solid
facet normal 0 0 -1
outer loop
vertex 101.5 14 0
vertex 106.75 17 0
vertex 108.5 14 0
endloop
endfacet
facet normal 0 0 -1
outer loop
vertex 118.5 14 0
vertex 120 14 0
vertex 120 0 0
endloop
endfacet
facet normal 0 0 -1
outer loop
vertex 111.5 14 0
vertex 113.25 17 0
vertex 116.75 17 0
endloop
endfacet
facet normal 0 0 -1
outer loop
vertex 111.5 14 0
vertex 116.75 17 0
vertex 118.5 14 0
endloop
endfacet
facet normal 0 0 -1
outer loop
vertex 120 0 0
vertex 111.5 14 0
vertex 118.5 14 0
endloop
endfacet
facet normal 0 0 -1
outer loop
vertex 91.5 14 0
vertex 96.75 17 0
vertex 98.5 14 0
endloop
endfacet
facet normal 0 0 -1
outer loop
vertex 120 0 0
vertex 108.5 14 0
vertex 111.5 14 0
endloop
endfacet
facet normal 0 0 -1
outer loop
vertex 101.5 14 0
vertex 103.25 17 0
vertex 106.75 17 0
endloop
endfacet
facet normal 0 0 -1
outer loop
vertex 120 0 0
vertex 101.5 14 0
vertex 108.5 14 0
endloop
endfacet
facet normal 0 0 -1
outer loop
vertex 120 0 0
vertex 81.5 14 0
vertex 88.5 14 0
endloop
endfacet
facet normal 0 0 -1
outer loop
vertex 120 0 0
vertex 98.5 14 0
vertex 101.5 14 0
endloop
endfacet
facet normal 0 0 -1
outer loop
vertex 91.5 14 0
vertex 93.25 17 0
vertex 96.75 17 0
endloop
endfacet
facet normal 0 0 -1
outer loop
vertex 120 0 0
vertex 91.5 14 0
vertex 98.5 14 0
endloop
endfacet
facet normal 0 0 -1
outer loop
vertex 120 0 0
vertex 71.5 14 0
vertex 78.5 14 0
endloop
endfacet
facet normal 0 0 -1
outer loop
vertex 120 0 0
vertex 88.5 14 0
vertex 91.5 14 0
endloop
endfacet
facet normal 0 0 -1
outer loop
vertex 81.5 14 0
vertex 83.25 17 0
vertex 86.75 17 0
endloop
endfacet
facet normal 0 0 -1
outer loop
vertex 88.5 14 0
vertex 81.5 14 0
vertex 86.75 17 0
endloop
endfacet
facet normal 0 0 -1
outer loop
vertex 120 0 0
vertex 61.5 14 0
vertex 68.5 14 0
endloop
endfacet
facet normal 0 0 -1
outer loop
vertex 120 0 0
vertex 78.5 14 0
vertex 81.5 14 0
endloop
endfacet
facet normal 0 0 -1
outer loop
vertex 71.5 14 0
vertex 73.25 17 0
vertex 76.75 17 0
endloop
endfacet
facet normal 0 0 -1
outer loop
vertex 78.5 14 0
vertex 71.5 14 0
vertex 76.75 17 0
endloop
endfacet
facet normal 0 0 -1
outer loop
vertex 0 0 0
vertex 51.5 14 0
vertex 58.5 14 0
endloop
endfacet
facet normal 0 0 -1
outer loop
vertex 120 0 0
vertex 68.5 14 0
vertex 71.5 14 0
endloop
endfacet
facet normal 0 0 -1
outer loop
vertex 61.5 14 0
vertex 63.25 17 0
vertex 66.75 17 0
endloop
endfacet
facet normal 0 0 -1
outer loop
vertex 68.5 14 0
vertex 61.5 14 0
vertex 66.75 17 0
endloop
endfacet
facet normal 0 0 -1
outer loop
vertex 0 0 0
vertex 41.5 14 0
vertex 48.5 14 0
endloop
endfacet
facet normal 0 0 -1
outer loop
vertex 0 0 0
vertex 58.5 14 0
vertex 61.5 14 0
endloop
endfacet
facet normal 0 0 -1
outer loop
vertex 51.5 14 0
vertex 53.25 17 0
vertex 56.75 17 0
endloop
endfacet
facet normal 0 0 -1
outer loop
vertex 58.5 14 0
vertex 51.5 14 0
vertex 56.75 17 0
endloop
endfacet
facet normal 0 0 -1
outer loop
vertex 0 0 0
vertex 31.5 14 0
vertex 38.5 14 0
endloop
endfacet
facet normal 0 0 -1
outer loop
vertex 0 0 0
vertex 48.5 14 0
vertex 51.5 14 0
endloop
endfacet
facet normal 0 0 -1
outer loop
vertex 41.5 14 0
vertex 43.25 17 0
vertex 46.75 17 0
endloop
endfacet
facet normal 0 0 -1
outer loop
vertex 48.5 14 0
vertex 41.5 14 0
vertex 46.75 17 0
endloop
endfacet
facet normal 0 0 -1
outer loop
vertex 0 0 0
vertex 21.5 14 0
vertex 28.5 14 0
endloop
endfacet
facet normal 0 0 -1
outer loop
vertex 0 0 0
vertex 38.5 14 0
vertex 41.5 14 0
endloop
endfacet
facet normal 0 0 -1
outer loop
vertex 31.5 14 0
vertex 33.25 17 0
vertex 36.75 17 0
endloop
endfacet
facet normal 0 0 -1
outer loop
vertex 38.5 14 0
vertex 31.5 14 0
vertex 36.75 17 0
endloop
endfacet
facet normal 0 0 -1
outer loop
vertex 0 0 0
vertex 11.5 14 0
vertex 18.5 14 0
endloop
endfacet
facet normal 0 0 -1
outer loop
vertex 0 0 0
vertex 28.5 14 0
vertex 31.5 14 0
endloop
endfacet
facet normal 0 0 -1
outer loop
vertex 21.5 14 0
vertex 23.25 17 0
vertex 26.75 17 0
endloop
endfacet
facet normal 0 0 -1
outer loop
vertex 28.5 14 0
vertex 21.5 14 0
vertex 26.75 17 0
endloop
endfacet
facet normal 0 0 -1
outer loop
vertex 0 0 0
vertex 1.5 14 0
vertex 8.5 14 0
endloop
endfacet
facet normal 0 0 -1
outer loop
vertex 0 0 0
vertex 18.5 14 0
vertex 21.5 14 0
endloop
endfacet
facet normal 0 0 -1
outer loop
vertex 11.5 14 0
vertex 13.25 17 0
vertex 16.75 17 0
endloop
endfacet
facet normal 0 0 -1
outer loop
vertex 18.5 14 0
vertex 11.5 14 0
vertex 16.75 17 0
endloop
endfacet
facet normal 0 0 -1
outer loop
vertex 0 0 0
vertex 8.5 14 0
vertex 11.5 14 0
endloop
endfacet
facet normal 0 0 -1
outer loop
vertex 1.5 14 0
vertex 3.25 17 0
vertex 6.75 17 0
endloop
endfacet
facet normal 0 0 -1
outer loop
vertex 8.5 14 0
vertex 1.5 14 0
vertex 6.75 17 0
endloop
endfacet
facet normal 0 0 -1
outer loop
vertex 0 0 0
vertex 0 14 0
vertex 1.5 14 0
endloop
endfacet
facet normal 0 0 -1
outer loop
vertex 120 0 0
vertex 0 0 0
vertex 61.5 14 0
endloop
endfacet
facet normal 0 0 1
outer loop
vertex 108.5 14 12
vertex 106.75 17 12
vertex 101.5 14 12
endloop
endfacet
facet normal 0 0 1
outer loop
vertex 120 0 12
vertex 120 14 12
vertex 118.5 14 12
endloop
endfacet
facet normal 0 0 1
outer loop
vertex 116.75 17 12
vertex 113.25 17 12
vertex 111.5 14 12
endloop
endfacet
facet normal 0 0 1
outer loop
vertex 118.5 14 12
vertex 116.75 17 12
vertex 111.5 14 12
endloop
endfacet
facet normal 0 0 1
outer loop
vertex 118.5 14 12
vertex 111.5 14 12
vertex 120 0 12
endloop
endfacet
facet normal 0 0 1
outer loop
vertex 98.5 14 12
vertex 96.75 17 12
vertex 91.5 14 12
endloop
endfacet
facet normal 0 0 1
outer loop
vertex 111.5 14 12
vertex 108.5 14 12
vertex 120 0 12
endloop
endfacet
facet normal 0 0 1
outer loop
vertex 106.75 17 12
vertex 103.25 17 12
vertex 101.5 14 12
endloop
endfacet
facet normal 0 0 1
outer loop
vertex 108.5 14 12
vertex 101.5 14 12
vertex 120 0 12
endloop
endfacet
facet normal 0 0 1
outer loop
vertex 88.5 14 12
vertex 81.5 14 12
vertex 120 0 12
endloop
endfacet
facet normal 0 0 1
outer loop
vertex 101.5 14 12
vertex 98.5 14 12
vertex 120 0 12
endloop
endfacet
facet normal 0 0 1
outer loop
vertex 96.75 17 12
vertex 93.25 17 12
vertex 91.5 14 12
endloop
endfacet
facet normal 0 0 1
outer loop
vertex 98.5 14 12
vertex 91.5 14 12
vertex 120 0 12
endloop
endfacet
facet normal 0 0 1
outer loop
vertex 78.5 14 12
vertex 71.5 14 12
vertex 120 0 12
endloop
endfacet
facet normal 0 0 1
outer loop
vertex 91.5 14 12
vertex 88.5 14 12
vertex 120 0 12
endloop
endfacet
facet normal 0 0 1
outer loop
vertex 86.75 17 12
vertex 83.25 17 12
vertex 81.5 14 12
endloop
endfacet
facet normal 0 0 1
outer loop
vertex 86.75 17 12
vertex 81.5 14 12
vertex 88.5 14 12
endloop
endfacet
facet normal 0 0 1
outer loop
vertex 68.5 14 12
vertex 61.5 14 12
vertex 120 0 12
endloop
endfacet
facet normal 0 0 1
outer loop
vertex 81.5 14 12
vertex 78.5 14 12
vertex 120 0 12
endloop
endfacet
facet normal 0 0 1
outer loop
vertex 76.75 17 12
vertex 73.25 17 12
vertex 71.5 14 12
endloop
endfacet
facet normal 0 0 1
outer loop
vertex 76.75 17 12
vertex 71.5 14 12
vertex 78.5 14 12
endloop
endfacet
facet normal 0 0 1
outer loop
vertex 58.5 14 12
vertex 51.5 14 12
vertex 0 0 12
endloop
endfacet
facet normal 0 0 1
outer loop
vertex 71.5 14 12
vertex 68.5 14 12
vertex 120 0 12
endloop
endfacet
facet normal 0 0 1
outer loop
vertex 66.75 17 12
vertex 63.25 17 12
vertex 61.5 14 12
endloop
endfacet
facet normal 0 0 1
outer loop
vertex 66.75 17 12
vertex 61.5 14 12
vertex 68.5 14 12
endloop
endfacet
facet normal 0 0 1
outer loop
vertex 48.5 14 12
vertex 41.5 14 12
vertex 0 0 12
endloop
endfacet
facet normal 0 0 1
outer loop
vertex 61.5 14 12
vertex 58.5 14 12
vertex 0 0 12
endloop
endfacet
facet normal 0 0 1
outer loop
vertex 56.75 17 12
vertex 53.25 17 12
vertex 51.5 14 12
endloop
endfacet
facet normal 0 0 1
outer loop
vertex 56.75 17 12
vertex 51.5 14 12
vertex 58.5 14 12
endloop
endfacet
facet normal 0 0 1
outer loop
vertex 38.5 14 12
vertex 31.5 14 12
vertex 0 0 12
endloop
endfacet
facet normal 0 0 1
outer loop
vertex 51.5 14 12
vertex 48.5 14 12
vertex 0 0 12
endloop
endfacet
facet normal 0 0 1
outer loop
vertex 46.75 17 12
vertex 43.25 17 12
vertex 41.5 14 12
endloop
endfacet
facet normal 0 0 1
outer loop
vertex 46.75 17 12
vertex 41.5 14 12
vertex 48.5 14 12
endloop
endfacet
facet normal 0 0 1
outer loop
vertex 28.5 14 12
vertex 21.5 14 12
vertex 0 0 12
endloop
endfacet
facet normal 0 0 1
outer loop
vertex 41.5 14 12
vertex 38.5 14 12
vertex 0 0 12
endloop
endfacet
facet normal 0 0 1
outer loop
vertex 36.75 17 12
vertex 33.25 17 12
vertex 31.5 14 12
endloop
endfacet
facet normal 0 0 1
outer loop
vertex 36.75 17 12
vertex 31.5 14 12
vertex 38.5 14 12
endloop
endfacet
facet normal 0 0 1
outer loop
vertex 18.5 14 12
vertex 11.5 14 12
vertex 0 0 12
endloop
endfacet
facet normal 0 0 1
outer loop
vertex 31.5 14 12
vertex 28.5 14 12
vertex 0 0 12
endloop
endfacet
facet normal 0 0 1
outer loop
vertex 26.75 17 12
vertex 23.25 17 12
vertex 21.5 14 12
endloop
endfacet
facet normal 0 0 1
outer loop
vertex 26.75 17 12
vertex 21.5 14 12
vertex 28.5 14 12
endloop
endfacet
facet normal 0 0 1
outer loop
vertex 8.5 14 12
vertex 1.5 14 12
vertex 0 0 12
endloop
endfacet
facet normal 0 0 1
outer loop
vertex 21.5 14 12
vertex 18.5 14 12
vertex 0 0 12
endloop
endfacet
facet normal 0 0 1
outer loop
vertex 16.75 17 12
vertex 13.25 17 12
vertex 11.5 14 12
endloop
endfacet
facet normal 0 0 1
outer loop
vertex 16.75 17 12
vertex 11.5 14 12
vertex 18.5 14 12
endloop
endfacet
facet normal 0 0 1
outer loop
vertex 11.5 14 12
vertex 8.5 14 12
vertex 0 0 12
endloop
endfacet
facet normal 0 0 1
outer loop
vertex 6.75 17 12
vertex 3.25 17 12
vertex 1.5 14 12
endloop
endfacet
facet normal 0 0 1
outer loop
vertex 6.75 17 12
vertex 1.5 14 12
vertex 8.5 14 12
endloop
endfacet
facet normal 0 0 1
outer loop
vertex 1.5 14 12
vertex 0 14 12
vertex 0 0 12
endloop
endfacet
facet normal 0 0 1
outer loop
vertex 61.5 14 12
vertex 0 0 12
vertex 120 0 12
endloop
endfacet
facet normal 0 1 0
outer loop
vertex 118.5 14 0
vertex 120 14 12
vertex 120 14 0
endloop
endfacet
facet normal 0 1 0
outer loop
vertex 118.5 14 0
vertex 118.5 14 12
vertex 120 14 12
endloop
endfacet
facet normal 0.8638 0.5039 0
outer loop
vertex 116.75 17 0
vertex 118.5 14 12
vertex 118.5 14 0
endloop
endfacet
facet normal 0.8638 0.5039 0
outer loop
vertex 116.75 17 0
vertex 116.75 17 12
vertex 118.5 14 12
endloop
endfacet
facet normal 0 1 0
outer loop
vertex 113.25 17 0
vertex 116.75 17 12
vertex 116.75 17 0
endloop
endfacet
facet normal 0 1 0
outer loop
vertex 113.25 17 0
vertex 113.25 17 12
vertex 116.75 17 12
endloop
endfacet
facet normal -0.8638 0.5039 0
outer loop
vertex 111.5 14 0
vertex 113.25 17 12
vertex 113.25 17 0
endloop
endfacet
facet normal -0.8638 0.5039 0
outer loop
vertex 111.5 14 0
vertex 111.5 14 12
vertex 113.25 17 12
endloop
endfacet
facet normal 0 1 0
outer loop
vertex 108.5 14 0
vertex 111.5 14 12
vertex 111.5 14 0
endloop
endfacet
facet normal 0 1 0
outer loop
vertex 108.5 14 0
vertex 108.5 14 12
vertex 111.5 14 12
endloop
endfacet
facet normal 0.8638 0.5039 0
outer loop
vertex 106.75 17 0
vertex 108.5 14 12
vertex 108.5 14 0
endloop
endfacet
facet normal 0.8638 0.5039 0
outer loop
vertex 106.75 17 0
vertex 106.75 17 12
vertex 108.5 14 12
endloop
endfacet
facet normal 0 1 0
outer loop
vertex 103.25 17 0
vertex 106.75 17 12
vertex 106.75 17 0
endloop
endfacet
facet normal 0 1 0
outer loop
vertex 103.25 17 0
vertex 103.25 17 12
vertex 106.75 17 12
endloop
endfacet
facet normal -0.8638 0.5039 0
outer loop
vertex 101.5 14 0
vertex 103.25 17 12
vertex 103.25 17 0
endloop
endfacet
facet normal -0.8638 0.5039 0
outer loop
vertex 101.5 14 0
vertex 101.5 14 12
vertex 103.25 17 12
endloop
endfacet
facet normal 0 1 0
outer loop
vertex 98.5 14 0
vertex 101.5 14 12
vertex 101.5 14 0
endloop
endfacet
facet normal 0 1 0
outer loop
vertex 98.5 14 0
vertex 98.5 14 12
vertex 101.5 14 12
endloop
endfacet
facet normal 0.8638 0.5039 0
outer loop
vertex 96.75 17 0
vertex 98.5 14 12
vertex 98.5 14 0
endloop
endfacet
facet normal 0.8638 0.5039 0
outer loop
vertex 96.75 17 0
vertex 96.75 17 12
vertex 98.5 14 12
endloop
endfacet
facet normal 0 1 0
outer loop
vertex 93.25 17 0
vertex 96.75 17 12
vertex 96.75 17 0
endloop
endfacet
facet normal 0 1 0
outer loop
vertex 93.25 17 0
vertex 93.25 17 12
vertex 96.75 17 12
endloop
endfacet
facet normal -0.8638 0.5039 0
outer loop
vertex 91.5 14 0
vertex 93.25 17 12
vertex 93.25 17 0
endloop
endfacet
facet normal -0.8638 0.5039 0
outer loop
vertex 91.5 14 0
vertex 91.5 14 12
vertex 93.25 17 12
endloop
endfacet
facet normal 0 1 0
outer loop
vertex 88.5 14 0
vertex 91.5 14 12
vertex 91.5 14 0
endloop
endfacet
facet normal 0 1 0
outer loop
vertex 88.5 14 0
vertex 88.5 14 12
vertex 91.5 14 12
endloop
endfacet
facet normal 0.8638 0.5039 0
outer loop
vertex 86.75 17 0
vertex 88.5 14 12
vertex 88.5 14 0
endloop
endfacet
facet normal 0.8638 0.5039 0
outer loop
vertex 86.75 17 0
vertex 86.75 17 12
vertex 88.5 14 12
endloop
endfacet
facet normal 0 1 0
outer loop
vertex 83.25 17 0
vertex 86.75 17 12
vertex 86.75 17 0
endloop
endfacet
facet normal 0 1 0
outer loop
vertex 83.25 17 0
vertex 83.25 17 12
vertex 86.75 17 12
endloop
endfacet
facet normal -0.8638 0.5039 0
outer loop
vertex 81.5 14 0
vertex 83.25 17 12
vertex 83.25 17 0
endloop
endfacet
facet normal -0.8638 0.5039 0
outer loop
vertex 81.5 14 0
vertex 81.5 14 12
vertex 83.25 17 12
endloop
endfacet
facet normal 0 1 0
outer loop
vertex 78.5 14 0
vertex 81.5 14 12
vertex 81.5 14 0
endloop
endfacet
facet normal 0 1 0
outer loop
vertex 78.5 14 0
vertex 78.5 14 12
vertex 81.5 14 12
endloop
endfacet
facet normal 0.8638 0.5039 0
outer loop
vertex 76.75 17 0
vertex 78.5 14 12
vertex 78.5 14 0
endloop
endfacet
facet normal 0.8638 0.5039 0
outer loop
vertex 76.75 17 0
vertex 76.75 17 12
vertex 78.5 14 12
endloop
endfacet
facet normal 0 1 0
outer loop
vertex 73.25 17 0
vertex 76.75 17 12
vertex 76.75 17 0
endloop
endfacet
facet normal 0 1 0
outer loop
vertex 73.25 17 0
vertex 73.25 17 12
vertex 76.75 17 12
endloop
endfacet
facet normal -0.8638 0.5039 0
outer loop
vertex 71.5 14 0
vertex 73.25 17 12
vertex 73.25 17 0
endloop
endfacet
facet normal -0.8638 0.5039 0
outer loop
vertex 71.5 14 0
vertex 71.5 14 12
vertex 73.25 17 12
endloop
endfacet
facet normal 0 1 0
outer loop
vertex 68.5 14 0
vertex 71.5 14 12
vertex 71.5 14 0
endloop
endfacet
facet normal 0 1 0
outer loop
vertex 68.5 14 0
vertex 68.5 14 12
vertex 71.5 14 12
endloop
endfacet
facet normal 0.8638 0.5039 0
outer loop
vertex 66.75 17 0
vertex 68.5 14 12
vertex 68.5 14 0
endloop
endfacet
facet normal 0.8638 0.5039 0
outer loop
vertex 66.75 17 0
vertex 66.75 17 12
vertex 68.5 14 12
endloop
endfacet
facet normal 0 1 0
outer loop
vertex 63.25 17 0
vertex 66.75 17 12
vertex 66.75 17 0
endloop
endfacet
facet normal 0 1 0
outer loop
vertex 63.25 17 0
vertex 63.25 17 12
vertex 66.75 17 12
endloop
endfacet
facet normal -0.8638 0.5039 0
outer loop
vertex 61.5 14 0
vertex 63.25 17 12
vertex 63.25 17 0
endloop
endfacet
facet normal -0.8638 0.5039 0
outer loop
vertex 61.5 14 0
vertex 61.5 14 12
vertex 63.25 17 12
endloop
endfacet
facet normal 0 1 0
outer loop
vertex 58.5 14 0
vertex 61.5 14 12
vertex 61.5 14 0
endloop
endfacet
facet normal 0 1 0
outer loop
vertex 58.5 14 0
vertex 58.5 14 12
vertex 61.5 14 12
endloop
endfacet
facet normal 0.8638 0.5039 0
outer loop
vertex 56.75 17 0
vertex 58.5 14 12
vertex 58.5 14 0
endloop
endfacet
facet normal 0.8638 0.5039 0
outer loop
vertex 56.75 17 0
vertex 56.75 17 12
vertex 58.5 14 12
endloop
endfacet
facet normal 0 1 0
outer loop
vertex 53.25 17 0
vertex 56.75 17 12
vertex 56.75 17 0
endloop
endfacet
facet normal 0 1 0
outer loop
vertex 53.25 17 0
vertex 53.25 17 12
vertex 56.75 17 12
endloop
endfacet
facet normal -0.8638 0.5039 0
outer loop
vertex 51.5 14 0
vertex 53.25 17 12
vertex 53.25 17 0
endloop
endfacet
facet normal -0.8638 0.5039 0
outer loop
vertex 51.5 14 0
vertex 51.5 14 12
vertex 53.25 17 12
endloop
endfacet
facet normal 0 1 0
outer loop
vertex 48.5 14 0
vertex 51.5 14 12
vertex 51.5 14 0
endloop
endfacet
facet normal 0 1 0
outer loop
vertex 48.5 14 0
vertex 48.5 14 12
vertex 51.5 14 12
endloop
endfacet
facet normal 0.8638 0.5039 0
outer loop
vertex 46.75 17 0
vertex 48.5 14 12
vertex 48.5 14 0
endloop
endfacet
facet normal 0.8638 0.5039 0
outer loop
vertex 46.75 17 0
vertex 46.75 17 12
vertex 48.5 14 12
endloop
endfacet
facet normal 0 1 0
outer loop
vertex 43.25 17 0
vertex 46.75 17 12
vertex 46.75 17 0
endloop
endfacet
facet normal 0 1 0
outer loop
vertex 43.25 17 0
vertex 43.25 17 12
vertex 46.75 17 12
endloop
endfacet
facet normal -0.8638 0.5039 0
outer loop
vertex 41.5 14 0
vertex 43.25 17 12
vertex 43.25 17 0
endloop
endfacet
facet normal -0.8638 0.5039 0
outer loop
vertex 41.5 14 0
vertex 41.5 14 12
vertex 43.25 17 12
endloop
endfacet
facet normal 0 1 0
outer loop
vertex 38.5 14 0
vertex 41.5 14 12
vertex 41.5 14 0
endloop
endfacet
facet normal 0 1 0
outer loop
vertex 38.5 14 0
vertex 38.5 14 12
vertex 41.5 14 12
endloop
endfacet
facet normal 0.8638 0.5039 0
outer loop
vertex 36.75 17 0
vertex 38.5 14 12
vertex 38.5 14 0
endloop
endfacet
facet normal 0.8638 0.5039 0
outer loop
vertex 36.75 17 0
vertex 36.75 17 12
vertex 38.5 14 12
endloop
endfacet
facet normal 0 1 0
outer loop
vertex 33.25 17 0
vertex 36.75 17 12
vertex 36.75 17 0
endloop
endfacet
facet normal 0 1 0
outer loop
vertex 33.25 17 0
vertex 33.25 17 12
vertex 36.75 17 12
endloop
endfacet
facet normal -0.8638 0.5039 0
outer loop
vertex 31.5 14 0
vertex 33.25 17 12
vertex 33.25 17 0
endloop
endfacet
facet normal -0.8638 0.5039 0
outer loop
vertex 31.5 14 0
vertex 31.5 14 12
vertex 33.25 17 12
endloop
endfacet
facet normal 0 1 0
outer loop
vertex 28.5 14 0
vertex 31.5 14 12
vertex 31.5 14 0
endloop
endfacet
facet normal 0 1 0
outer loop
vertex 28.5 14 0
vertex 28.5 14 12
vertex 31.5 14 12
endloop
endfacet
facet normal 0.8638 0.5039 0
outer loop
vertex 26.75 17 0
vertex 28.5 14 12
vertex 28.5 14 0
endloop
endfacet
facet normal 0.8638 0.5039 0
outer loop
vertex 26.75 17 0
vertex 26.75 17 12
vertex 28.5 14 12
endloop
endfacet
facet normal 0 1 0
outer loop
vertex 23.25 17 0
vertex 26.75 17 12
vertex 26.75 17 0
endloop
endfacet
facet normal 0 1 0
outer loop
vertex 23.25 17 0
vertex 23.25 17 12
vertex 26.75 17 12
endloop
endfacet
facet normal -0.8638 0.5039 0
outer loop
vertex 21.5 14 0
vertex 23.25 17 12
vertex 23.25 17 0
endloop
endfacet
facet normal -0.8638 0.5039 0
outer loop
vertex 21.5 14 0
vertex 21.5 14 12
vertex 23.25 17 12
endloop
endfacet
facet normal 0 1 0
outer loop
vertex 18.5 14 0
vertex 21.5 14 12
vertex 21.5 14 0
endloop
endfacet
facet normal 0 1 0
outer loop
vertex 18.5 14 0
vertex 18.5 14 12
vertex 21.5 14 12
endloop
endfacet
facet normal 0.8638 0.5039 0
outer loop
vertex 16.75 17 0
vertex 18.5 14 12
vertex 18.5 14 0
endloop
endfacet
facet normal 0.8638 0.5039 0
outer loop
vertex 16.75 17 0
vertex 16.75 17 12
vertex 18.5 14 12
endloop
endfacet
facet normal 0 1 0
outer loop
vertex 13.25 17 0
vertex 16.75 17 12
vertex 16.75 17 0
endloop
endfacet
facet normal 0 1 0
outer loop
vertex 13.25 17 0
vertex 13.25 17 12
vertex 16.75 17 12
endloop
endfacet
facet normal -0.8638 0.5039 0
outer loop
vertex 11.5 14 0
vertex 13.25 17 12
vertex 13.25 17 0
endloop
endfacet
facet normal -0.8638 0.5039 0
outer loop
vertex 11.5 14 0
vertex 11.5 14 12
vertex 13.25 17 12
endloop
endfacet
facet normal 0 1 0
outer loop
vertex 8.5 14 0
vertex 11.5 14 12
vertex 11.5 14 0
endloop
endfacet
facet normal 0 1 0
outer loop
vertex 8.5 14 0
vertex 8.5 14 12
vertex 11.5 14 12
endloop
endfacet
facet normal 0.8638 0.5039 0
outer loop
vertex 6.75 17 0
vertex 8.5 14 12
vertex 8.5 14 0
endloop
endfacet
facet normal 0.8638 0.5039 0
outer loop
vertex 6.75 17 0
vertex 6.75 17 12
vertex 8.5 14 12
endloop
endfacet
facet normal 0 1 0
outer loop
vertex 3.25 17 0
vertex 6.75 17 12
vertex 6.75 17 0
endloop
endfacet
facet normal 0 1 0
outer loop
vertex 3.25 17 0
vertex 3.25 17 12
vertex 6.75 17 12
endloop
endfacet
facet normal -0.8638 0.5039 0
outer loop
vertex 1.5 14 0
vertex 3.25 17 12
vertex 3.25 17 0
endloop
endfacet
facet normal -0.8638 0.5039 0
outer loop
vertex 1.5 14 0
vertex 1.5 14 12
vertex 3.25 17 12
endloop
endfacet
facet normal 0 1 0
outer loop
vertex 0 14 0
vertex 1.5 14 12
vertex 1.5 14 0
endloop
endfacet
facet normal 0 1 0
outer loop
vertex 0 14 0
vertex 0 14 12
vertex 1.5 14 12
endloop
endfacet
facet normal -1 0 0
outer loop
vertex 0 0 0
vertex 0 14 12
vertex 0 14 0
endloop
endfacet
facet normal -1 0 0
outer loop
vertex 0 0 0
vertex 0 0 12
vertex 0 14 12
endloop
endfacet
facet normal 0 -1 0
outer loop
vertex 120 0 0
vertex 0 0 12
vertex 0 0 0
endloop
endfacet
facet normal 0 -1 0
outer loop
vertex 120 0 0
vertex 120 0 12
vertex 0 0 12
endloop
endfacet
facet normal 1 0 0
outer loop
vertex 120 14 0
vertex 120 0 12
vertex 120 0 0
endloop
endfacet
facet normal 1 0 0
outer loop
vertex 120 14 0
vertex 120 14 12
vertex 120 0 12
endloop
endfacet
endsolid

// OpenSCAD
$fn = 32;

// ----------------------------------------------------------------------
// Gear rack: 12 teeth, pitch 10 mm
// ----------------------------------------------------------------------

// --- parameters (mm) ---
teeth = 12;               // number of teeth
pitch = 10;               // tooth pitch, X
root_w = 7;               // tooth width at the root
tip_w = 3.5;              // tooth width at the tip
base_h = 14;              // rack body height, Y
tooth_h = 3;              // tooth height above the body
plate_t = 12;             // rack width, Z (extrusion height)

rack_l = teeth * pitch;  // overall length
total_h = base_h + tooth_h;  // overall height

profile = [[0, 0], [120, 0], [120, 14], [118.5, 14], [116.75, 17], [113.25, 17], [111.5, 14], [108.5, 14], [106.75, 17], [103.25, 17], [101.5, 14], [98.5, 14], [96.75, 17], [93.25, 17], [91.5, 14], [88.5, 14], [86.75, 17], [83.25, 17], [81.5, 14], [78.5, 14], [76.75, 17], [73.25, 17], [71.5, 14], [68.5, 14], [66.75, 17], [63.25, 17], [61.5, 14], [58.5, 14], [56.75, 17], [53.25, 17], [51.5, 14], [48.5, 14], [46.75, 17], [43.25, 17], [41.5, 14], [38.5, 14], [36.75, 17], [33.25, 17], [31.5, 14], [28.5, 14], [26.75, 17], [23.25, 17], [21.5, 14], [18.5, 14], [16.75, 17], [13.25, 17], [11.5, 14], [8.5, 14], [6.75, 17], [3.25, 17], [1.5, 14], [0, 14]];  // primary outline, 52 points, counter clockwise

// --- the one profile operation ---
linear_extrude(height = plate_t) polygon(points = profile);
